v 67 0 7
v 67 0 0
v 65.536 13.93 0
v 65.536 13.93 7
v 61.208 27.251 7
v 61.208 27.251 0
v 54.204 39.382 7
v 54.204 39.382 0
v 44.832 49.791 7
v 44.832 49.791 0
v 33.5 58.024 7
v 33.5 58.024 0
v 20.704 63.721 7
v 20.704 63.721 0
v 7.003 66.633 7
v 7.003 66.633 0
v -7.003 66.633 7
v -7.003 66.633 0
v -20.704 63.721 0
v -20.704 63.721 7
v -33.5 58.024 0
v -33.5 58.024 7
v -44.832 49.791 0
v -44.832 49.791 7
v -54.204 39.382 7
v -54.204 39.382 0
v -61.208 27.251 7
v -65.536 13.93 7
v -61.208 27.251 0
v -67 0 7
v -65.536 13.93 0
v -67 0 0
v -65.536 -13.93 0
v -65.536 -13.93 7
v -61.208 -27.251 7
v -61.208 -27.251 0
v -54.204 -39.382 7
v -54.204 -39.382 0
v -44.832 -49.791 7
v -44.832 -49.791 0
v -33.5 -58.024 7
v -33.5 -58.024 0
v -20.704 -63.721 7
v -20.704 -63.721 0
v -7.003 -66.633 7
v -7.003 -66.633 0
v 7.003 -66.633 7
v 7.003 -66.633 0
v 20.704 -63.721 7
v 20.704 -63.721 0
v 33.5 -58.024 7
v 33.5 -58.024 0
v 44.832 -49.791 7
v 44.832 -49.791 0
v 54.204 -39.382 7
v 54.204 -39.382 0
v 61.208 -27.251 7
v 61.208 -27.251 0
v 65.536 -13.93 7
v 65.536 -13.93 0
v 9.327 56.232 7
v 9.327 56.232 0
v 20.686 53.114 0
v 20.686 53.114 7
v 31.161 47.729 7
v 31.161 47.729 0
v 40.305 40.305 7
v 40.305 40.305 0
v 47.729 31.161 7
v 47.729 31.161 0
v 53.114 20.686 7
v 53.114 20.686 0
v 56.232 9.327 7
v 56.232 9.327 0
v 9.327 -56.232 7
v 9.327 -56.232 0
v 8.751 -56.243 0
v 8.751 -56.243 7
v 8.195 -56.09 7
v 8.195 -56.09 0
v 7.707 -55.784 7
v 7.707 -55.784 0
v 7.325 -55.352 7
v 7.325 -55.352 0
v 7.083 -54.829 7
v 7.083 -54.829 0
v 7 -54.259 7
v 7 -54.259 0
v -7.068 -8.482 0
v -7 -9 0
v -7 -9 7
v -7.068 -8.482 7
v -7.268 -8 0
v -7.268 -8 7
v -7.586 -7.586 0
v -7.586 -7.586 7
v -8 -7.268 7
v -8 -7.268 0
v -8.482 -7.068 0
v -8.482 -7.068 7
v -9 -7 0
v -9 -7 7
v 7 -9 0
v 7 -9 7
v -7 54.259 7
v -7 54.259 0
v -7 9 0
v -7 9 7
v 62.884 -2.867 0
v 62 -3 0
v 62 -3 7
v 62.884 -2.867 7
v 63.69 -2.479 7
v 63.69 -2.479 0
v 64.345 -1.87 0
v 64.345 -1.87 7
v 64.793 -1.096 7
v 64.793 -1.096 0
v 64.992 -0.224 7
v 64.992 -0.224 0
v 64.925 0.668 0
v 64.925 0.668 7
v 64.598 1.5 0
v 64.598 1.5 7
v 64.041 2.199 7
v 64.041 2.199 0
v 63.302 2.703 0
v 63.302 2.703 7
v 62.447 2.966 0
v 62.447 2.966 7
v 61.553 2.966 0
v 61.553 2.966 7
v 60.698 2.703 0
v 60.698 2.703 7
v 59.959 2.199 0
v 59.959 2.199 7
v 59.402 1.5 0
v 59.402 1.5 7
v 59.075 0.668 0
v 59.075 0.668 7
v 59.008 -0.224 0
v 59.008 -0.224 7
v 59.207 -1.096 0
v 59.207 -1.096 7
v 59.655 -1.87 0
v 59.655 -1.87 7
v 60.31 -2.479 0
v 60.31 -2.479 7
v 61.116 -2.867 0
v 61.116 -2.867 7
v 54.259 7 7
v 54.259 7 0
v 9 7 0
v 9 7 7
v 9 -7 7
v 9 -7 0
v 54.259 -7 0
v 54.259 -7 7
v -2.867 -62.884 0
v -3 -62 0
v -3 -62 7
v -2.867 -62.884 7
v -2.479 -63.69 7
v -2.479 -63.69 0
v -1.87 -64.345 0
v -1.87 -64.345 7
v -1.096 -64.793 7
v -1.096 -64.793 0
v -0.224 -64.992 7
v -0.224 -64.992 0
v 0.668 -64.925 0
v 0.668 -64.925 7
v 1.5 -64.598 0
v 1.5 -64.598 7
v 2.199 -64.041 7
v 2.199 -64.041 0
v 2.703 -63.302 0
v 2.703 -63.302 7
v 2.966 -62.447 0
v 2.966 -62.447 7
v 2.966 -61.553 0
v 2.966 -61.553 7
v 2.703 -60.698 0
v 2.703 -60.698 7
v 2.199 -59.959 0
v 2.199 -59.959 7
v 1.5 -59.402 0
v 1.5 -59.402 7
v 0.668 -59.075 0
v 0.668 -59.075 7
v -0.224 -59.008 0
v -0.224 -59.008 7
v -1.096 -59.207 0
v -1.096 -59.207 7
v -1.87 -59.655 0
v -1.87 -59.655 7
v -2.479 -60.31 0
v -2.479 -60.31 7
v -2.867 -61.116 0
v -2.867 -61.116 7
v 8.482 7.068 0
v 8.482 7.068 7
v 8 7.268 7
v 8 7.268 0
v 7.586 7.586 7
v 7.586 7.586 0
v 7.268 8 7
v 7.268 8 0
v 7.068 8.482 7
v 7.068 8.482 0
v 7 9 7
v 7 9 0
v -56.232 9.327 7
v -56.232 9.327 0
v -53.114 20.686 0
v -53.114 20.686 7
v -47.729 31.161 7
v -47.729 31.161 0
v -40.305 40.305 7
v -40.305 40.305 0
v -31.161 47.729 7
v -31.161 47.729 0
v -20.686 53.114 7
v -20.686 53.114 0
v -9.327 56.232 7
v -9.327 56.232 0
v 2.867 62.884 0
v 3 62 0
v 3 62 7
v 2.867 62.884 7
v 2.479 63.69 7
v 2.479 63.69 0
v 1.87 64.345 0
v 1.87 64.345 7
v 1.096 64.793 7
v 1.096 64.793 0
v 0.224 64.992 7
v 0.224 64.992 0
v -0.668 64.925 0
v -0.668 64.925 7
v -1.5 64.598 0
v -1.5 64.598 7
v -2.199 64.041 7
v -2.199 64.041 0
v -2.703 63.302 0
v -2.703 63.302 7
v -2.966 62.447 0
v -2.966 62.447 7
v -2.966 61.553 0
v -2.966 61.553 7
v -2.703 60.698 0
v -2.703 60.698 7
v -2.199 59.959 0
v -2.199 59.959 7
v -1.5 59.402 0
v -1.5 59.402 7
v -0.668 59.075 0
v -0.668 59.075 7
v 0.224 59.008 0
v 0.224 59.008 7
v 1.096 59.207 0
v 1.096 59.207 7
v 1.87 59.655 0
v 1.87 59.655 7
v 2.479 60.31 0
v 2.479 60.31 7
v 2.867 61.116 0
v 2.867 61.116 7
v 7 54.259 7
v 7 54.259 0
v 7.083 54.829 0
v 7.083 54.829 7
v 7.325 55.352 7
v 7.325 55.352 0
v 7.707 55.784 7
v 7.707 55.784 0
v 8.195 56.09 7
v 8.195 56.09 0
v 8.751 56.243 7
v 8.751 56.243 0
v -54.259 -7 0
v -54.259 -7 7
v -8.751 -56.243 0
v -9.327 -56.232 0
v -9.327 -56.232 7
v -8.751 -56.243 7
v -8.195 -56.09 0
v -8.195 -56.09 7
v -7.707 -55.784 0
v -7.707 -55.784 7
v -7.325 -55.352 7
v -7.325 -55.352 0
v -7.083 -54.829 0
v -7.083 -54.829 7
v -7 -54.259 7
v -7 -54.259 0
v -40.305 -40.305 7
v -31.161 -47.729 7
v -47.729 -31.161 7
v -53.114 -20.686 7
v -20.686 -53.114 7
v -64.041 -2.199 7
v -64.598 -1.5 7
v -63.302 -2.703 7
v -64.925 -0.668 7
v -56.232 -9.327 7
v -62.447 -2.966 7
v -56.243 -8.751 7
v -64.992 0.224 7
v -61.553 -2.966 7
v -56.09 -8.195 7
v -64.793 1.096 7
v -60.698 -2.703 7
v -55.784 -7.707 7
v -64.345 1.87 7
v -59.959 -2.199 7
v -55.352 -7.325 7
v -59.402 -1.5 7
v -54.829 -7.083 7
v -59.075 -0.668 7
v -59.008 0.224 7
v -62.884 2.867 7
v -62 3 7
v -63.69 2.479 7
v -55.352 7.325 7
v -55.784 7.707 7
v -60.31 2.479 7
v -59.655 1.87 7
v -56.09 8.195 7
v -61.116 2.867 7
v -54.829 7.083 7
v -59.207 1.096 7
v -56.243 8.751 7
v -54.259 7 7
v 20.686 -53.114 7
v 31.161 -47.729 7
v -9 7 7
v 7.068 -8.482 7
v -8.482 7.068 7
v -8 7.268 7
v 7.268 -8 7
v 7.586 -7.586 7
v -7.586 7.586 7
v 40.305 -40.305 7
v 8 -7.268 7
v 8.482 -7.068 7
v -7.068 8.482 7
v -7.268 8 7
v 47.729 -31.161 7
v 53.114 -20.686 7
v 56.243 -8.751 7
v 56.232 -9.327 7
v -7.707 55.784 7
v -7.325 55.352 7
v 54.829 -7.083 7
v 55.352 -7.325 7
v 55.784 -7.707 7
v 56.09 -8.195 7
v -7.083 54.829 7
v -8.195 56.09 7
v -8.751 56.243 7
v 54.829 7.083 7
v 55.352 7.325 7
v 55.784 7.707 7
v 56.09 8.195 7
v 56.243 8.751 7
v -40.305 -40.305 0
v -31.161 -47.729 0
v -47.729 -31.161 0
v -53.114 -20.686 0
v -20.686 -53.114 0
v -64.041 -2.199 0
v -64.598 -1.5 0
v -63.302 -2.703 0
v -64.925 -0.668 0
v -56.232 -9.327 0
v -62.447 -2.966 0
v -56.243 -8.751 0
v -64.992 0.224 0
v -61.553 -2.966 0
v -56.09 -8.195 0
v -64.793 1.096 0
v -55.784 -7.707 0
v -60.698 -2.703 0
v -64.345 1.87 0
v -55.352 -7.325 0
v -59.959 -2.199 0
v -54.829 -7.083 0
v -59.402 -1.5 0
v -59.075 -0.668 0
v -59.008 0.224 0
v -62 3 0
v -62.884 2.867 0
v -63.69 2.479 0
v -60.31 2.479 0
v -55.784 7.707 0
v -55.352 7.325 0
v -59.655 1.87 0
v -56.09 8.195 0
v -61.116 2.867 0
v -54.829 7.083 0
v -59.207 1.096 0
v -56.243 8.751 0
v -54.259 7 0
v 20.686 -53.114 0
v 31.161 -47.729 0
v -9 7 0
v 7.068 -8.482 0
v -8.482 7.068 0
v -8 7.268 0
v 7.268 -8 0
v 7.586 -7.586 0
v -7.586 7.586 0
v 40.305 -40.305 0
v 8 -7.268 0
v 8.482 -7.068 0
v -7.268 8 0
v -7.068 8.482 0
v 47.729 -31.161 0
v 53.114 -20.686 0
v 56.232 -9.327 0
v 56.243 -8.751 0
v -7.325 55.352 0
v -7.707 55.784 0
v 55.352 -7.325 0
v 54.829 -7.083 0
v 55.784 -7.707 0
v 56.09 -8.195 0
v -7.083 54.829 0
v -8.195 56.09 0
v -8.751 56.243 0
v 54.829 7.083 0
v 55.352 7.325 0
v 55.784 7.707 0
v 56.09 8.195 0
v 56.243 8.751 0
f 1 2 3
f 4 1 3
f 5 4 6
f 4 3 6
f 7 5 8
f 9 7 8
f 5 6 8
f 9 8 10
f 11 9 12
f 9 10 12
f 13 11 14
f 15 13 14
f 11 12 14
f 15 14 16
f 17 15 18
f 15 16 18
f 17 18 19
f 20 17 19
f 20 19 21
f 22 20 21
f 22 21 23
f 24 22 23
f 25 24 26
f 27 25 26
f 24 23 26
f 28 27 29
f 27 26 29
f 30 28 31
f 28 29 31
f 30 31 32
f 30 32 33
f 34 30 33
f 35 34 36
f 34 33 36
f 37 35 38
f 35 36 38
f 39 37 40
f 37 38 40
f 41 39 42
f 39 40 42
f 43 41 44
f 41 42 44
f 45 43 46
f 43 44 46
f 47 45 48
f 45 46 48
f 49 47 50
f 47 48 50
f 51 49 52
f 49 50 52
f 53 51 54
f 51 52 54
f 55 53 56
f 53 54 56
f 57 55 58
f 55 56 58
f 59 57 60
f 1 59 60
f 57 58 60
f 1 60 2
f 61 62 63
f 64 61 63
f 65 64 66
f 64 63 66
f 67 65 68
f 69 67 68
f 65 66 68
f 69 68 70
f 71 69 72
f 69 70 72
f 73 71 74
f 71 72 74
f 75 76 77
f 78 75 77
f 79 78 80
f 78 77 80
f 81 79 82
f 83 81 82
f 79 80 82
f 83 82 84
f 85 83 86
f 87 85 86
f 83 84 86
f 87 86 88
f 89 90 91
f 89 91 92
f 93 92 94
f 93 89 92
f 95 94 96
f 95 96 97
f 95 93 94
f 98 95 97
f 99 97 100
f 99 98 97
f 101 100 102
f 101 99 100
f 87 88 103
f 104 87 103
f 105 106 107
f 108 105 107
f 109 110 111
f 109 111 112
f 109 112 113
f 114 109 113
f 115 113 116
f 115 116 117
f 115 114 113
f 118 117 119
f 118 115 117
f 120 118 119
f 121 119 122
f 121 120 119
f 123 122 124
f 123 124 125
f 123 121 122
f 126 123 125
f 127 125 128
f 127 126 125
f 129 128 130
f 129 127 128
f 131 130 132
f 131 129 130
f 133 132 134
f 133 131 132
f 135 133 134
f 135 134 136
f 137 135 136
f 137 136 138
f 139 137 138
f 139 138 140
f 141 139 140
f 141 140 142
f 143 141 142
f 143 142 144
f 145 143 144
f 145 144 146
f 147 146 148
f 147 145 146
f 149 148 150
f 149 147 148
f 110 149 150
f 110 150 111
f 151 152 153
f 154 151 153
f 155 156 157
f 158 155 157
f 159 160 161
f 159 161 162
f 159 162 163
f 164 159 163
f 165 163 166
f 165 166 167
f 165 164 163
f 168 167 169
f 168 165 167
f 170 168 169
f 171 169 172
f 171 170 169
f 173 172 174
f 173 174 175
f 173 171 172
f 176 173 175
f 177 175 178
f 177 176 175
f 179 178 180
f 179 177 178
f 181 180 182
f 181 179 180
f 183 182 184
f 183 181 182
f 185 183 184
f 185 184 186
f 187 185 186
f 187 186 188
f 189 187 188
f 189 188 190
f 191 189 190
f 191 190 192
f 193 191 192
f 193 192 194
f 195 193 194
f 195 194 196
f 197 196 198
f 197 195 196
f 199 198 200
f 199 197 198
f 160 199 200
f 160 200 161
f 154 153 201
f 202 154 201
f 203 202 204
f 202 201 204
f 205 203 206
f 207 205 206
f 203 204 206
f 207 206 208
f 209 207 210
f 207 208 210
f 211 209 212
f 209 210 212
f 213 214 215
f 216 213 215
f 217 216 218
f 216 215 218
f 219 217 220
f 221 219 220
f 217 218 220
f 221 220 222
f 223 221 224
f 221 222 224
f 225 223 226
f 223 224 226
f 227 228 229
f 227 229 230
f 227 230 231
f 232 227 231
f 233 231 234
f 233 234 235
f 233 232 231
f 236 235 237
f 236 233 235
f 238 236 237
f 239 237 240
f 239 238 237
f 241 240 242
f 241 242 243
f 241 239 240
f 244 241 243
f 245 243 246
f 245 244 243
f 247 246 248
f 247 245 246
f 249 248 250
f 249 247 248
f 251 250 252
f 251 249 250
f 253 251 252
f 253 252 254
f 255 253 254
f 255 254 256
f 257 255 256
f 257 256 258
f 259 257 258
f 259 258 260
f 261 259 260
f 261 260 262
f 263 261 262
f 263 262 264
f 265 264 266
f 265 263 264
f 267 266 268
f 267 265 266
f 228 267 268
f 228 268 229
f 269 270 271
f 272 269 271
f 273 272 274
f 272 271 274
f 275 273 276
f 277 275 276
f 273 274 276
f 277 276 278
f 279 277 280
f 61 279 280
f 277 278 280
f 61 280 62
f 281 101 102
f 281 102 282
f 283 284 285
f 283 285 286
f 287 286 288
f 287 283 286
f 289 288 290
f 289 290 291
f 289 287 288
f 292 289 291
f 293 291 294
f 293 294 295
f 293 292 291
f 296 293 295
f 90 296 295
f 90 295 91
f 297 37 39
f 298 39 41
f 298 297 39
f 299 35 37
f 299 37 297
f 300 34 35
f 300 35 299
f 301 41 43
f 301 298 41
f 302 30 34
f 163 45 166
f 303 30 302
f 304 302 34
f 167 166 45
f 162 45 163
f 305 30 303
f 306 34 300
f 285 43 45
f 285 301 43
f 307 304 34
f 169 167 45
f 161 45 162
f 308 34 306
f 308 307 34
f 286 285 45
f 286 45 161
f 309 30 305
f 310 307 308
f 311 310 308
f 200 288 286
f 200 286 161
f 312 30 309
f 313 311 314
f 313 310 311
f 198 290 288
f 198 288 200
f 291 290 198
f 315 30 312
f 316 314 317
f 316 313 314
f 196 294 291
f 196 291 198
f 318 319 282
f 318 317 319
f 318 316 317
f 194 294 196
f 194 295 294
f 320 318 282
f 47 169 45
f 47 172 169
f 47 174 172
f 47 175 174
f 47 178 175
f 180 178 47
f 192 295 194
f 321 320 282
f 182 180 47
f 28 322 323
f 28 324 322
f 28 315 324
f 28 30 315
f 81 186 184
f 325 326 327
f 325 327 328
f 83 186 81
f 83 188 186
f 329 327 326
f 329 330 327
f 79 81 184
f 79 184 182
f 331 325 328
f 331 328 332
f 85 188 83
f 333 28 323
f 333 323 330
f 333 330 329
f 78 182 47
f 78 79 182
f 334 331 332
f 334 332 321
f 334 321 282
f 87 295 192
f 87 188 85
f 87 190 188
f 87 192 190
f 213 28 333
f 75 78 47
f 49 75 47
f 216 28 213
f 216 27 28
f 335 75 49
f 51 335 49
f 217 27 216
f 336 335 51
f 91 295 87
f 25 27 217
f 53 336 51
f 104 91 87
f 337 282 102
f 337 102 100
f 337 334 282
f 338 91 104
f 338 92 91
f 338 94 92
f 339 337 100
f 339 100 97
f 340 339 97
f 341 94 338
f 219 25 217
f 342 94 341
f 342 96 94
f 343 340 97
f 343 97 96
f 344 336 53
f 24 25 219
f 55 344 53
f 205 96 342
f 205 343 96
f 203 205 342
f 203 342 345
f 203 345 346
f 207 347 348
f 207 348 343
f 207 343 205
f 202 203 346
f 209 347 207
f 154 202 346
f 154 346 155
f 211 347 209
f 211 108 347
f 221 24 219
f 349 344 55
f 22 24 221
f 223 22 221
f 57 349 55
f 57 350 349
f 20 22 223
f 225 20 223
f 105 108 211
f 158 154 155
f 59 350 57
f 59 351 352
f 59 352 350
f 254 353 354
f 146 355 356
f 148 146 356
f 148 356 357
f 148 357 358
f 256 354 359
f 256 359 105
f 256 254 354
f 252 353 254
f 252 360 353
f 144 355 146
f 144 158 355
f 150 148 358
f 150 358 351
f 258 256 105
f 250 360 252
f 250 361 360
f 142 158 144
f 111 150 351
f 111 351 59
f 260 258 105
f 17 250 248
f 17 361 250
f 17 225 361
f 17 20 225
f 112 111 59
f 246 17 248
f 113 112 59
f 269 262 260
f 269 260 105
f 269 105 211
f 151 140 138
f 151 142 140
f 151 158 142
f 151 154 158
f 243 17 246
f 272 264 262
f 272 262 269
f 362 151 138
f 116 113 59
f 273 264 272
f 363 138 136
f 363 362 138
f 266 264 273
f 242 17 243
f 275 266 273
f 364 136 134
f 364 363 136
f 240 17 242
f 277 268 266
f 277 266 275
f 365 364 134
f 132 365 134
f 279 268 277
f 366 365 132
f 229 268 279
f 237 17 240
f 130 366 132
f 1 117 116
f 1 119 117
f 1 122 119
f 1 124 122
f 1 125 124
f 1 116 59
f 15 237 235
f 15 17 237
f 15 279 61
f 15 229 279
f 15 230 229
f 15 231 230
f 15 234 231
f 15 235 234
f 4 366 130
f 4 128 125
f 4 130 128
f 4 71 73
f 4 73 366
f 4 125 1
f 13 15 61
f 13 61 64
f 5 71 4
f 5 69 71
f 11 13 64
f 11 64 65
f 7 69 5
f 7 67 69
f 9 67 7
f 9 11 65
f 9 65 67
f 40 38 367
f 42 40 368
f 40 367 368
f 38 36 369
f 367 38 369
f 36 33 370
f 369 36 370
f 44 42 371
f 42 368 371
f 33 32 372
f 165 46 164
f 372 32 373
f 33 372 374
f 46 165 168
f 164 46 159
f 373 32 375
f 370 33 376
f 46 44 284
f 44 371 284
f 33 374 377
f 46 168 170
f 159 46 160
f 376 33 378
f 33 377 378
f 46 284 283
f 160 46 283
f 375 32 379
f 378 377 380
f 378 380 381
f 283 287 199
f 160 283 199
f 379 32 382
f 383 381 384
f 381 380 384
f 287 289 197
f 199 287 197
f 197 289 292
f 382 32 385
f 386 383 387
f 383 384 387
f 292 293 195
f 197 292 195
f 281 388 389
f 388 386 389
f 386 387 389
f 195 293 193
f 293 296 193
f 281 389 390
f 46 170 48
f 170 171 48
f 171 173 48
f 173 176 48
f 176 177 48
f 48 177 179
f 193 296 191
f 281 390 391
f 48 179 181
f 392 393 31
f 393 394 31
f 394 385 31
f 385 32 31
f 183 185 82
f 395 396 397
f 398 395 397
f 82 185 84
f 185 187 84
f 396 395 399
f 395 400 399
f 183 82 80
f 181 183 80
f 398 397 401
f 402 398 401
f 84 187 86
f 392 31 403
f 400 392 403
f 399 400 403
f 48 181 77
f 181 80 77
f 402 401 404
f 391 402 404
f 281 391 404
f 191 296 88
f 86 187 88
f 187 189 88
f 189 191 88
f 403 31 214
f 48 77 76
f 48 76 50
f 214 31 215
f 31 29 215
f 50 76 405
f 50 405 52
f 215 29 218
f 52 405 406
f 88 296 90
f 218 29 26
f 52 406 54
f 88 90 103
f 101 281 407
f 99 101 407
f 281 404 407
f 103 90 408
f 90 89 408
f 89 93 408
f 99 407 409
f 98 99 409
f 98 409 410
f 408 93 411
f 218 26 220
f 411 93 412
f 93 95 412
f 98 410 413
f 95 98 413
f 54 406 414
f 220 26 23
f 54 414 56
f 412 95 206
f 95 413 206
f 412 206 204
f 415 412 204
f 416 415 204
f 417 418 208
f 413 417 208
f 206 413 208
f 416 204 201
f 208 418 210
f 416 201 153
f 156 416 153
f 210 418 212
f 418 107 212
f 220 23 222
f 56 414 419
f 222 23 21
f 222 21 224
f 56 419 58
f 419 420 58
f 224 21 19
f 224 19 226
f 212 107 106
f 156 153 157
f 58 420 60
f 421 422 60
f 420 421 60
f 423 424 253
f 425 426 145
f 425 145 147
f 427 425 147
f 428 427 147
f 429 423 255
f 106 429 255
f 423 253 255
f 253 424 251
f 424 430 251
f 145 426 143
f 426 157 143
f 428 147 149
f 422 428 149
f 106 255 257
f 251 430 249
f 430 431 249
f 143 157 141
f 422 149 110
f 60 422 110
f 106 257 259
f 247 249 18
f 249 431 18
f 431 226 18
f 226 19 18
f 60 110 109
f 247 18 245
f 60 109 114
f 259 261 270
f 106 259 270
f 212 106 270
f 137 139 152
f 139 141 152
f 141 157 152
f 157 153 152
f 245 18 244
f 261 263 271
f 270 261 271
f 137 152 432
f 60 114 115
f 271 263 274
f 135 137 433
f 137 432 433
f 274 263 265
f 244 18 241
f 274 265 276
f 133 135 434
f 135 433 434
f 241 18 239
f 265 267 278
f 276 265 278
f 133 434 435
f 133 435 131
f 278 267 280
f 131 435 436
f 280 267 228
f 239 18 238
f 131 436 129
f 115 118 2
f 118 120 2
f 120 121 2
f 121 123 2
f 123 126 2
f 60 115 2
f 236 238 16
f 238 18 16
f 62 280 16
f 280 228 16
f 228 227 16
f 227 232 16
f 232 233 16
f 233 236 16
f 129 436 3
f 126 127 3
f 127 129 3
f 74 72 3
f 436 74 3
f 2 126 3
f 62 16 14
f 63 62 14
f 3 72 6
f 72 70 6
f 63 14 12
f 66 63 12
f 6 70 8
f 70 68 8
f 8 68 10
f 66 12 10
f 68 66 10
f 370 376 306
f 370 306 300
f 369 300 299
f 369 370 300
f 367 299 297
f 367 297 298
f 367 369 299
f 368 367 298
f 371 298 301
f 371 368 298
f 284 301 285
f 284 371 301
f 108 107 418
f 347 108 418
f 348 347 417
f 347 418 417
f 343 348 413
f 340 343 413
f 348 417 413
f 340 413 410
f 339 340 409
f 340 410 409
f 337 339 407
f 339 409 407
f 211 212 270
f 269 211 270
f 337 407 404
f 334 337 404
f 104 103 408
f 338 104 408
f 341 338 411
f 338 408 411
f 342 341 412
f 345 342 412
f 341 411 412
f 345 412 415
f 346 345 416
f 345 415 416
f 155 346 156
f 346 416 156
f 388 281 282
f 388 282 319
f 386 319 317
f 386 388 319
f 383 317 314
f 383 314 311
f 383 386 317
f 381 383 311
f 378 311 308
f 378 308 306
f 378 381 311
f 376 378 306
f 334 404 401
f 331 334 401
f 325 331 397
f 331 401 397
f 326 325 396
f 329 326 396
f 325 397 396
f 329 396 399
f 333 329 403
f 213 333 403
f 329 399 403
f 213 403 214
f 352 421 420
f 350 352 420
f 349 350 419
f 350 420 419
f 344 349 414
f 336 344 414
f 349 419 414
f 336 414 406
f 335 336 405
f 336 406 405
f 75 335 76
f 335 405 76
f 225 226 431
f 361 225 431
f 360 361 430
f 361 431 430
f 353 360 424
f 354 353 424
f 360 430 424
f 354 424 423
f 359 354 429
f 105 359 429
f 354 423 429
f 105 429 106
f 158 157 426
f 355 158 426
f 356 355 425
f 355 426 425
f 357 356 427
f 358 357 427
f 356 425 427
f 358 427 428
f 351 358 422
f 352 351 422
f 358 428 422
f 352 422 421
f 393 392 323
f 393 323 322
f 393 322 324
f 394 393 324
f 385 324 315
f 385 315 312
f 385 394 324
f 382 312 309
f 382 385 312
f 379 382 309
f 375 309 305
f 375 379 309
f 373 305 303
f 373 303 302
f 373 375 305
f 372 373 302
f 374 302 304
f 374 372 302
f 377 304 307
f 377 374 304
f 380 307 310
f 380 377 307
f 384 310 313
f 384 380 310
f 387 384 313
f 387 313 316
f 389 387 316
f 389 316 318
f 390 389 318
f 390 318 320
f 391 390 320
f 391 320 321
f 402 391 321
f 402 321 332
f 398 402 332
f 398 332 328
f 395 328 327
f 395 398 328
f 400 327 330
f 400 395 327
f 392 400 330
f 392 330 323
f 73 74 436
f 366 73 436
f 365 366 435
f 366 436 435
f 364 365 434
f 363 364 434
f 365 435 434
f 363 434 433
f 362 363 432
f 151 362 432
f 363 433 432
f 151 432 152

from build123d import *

# Parameters (mm, degrees)
SCHIZZO2_R                   = 67
ESTRUSIONE_ESTRUSIONE1_DEPTH = 7
SCHIZZO3_R                   = 3
TAGLIO_ESTRUSIONE2_DEPTH     = 7
RIPETIZIONECIRCOLARE1_COUNT  = 4


with BuildPart() as part:
    # Schizzo2 → Estrusione-Estrusione1 (new body)
    with BuildSketch(Plane.XY):
        Circle(SCHIZZO2_R)
        with BuildLine():
            Line((7, 9), (7, 54.258639865))
            ThreePointArc((7, 54.258639865), (7.706660419, 55.784180008), (9.327272727, 56.231681315))
            ThreePointArc((9.327272727, 56.231681315), (40.305086528, 40.305086528), (56.231681315, 9.327272727))
            ThreePointArc((56.231681315, 9.327272727), (55.784180008, 7.706660419), (54.258639865, 7))
            Line((54.258639865, 7), (9, 7))
            ThreePointArc((9, 7), (7.585786438, 7.585786438), (7, 9))
        make_face(mode=Mode.SUBTRACT)
        with BuildLine():
            Line((-9, 7), (-54.258639865, 7))
            ThreePointArc((-54.258639865, 7), (-55.784180008, 7.706660419), (-56.231681315, 9.327272727))
            ThreePointArc((-56.231681315, 9.327272727), (-40.305086528, 40.305086528), (-9.327272727, 56.231681315))
            ThreePointArc((-9.327272727, 56.231681315), (-7.706660419, 55.784180008), (-7, 54.258639865))
            Line((-7, 54.258639865), (-7, 9))
            ThreePointArc((-7, 9), (-7.585786438, 7.585786438), (-9, 7))
        make_face(mode=Mode.SUBTRACT)
        with BuildLine():
            Line((-9, -7), (-54.258639865, -7))
            ThreePointArc((-54.258639865, -7), (-55.784180008, -7.706660419), (-56.231681315, -9.327272727))
            ThreePointArc((-56.231681315, -9.327272727), (-40.305086528, -40.305086528), (-9.327272727, -56.231681315))
            ThreePointArc((-9.327272727, -56.231681315), (-7.706660419, -55.784180008), (-7, -54.258639865))
            Line((-7, -54.258639865), (-7, -9))
            ThreePointArc((-7, -9), (-7.585786438, -7.585786438), (-9, -7))
        make_face(mode=Mode.SUBTRACT)
        with BuildLine():
            Line((7, -54.258639865), (7, -9))
            ThreePointArc((7, -9), (7.585786438, -7.585786438), (9, -7))
            Line((9, -7), (54.258639865, -7))
            ThreePointArc((54.258639865, -7), (55.784180008, -7.706660419), (56.231681315, -9.327272727))
            ThreePointArc((56.231681315, -9.327272727), (40.305086528, -40.305086528), (9.327272727, -56.231681315))
            ThreePointArc((9.327272727, -56.231681315), (7.706660419, -55.784180008), (7, -54.258639865))
        make_face(mode=Mode.SUBTRACT)
    extrude(amount=ESTRUSIONE_ESTRUSIONE1_DEPTH)

    # Schizzo3 → Taglio-Estrusione2 (cut)
    with BuildSketch(Plane.XY):
        with Locations((0, 62)):
            Circle(SCHIZZO3_R)
    taglio_estrusione2 = extrude(amount=TAGLIO_ESTRUSIONE2_DEPTH, mode=Mode.SUBTRACT)

    # RipetizioneCircolare1: Taglio-Estrusione2 ×4 about axis
    ripetizionecircolare1_axis = Axis((0, 0, 0), (0, 0, 1))
    for i in range(1, RIPETIZIONECIRCOLARE1_COUNT):
        add(taglio_estrusione2.rotate(ripetizionecircolare1_axis, i * 360 / RIPETIZIONECIRCOLARE1_COUNT), mode=Mode.SUBTRACT)


solid = part.part
